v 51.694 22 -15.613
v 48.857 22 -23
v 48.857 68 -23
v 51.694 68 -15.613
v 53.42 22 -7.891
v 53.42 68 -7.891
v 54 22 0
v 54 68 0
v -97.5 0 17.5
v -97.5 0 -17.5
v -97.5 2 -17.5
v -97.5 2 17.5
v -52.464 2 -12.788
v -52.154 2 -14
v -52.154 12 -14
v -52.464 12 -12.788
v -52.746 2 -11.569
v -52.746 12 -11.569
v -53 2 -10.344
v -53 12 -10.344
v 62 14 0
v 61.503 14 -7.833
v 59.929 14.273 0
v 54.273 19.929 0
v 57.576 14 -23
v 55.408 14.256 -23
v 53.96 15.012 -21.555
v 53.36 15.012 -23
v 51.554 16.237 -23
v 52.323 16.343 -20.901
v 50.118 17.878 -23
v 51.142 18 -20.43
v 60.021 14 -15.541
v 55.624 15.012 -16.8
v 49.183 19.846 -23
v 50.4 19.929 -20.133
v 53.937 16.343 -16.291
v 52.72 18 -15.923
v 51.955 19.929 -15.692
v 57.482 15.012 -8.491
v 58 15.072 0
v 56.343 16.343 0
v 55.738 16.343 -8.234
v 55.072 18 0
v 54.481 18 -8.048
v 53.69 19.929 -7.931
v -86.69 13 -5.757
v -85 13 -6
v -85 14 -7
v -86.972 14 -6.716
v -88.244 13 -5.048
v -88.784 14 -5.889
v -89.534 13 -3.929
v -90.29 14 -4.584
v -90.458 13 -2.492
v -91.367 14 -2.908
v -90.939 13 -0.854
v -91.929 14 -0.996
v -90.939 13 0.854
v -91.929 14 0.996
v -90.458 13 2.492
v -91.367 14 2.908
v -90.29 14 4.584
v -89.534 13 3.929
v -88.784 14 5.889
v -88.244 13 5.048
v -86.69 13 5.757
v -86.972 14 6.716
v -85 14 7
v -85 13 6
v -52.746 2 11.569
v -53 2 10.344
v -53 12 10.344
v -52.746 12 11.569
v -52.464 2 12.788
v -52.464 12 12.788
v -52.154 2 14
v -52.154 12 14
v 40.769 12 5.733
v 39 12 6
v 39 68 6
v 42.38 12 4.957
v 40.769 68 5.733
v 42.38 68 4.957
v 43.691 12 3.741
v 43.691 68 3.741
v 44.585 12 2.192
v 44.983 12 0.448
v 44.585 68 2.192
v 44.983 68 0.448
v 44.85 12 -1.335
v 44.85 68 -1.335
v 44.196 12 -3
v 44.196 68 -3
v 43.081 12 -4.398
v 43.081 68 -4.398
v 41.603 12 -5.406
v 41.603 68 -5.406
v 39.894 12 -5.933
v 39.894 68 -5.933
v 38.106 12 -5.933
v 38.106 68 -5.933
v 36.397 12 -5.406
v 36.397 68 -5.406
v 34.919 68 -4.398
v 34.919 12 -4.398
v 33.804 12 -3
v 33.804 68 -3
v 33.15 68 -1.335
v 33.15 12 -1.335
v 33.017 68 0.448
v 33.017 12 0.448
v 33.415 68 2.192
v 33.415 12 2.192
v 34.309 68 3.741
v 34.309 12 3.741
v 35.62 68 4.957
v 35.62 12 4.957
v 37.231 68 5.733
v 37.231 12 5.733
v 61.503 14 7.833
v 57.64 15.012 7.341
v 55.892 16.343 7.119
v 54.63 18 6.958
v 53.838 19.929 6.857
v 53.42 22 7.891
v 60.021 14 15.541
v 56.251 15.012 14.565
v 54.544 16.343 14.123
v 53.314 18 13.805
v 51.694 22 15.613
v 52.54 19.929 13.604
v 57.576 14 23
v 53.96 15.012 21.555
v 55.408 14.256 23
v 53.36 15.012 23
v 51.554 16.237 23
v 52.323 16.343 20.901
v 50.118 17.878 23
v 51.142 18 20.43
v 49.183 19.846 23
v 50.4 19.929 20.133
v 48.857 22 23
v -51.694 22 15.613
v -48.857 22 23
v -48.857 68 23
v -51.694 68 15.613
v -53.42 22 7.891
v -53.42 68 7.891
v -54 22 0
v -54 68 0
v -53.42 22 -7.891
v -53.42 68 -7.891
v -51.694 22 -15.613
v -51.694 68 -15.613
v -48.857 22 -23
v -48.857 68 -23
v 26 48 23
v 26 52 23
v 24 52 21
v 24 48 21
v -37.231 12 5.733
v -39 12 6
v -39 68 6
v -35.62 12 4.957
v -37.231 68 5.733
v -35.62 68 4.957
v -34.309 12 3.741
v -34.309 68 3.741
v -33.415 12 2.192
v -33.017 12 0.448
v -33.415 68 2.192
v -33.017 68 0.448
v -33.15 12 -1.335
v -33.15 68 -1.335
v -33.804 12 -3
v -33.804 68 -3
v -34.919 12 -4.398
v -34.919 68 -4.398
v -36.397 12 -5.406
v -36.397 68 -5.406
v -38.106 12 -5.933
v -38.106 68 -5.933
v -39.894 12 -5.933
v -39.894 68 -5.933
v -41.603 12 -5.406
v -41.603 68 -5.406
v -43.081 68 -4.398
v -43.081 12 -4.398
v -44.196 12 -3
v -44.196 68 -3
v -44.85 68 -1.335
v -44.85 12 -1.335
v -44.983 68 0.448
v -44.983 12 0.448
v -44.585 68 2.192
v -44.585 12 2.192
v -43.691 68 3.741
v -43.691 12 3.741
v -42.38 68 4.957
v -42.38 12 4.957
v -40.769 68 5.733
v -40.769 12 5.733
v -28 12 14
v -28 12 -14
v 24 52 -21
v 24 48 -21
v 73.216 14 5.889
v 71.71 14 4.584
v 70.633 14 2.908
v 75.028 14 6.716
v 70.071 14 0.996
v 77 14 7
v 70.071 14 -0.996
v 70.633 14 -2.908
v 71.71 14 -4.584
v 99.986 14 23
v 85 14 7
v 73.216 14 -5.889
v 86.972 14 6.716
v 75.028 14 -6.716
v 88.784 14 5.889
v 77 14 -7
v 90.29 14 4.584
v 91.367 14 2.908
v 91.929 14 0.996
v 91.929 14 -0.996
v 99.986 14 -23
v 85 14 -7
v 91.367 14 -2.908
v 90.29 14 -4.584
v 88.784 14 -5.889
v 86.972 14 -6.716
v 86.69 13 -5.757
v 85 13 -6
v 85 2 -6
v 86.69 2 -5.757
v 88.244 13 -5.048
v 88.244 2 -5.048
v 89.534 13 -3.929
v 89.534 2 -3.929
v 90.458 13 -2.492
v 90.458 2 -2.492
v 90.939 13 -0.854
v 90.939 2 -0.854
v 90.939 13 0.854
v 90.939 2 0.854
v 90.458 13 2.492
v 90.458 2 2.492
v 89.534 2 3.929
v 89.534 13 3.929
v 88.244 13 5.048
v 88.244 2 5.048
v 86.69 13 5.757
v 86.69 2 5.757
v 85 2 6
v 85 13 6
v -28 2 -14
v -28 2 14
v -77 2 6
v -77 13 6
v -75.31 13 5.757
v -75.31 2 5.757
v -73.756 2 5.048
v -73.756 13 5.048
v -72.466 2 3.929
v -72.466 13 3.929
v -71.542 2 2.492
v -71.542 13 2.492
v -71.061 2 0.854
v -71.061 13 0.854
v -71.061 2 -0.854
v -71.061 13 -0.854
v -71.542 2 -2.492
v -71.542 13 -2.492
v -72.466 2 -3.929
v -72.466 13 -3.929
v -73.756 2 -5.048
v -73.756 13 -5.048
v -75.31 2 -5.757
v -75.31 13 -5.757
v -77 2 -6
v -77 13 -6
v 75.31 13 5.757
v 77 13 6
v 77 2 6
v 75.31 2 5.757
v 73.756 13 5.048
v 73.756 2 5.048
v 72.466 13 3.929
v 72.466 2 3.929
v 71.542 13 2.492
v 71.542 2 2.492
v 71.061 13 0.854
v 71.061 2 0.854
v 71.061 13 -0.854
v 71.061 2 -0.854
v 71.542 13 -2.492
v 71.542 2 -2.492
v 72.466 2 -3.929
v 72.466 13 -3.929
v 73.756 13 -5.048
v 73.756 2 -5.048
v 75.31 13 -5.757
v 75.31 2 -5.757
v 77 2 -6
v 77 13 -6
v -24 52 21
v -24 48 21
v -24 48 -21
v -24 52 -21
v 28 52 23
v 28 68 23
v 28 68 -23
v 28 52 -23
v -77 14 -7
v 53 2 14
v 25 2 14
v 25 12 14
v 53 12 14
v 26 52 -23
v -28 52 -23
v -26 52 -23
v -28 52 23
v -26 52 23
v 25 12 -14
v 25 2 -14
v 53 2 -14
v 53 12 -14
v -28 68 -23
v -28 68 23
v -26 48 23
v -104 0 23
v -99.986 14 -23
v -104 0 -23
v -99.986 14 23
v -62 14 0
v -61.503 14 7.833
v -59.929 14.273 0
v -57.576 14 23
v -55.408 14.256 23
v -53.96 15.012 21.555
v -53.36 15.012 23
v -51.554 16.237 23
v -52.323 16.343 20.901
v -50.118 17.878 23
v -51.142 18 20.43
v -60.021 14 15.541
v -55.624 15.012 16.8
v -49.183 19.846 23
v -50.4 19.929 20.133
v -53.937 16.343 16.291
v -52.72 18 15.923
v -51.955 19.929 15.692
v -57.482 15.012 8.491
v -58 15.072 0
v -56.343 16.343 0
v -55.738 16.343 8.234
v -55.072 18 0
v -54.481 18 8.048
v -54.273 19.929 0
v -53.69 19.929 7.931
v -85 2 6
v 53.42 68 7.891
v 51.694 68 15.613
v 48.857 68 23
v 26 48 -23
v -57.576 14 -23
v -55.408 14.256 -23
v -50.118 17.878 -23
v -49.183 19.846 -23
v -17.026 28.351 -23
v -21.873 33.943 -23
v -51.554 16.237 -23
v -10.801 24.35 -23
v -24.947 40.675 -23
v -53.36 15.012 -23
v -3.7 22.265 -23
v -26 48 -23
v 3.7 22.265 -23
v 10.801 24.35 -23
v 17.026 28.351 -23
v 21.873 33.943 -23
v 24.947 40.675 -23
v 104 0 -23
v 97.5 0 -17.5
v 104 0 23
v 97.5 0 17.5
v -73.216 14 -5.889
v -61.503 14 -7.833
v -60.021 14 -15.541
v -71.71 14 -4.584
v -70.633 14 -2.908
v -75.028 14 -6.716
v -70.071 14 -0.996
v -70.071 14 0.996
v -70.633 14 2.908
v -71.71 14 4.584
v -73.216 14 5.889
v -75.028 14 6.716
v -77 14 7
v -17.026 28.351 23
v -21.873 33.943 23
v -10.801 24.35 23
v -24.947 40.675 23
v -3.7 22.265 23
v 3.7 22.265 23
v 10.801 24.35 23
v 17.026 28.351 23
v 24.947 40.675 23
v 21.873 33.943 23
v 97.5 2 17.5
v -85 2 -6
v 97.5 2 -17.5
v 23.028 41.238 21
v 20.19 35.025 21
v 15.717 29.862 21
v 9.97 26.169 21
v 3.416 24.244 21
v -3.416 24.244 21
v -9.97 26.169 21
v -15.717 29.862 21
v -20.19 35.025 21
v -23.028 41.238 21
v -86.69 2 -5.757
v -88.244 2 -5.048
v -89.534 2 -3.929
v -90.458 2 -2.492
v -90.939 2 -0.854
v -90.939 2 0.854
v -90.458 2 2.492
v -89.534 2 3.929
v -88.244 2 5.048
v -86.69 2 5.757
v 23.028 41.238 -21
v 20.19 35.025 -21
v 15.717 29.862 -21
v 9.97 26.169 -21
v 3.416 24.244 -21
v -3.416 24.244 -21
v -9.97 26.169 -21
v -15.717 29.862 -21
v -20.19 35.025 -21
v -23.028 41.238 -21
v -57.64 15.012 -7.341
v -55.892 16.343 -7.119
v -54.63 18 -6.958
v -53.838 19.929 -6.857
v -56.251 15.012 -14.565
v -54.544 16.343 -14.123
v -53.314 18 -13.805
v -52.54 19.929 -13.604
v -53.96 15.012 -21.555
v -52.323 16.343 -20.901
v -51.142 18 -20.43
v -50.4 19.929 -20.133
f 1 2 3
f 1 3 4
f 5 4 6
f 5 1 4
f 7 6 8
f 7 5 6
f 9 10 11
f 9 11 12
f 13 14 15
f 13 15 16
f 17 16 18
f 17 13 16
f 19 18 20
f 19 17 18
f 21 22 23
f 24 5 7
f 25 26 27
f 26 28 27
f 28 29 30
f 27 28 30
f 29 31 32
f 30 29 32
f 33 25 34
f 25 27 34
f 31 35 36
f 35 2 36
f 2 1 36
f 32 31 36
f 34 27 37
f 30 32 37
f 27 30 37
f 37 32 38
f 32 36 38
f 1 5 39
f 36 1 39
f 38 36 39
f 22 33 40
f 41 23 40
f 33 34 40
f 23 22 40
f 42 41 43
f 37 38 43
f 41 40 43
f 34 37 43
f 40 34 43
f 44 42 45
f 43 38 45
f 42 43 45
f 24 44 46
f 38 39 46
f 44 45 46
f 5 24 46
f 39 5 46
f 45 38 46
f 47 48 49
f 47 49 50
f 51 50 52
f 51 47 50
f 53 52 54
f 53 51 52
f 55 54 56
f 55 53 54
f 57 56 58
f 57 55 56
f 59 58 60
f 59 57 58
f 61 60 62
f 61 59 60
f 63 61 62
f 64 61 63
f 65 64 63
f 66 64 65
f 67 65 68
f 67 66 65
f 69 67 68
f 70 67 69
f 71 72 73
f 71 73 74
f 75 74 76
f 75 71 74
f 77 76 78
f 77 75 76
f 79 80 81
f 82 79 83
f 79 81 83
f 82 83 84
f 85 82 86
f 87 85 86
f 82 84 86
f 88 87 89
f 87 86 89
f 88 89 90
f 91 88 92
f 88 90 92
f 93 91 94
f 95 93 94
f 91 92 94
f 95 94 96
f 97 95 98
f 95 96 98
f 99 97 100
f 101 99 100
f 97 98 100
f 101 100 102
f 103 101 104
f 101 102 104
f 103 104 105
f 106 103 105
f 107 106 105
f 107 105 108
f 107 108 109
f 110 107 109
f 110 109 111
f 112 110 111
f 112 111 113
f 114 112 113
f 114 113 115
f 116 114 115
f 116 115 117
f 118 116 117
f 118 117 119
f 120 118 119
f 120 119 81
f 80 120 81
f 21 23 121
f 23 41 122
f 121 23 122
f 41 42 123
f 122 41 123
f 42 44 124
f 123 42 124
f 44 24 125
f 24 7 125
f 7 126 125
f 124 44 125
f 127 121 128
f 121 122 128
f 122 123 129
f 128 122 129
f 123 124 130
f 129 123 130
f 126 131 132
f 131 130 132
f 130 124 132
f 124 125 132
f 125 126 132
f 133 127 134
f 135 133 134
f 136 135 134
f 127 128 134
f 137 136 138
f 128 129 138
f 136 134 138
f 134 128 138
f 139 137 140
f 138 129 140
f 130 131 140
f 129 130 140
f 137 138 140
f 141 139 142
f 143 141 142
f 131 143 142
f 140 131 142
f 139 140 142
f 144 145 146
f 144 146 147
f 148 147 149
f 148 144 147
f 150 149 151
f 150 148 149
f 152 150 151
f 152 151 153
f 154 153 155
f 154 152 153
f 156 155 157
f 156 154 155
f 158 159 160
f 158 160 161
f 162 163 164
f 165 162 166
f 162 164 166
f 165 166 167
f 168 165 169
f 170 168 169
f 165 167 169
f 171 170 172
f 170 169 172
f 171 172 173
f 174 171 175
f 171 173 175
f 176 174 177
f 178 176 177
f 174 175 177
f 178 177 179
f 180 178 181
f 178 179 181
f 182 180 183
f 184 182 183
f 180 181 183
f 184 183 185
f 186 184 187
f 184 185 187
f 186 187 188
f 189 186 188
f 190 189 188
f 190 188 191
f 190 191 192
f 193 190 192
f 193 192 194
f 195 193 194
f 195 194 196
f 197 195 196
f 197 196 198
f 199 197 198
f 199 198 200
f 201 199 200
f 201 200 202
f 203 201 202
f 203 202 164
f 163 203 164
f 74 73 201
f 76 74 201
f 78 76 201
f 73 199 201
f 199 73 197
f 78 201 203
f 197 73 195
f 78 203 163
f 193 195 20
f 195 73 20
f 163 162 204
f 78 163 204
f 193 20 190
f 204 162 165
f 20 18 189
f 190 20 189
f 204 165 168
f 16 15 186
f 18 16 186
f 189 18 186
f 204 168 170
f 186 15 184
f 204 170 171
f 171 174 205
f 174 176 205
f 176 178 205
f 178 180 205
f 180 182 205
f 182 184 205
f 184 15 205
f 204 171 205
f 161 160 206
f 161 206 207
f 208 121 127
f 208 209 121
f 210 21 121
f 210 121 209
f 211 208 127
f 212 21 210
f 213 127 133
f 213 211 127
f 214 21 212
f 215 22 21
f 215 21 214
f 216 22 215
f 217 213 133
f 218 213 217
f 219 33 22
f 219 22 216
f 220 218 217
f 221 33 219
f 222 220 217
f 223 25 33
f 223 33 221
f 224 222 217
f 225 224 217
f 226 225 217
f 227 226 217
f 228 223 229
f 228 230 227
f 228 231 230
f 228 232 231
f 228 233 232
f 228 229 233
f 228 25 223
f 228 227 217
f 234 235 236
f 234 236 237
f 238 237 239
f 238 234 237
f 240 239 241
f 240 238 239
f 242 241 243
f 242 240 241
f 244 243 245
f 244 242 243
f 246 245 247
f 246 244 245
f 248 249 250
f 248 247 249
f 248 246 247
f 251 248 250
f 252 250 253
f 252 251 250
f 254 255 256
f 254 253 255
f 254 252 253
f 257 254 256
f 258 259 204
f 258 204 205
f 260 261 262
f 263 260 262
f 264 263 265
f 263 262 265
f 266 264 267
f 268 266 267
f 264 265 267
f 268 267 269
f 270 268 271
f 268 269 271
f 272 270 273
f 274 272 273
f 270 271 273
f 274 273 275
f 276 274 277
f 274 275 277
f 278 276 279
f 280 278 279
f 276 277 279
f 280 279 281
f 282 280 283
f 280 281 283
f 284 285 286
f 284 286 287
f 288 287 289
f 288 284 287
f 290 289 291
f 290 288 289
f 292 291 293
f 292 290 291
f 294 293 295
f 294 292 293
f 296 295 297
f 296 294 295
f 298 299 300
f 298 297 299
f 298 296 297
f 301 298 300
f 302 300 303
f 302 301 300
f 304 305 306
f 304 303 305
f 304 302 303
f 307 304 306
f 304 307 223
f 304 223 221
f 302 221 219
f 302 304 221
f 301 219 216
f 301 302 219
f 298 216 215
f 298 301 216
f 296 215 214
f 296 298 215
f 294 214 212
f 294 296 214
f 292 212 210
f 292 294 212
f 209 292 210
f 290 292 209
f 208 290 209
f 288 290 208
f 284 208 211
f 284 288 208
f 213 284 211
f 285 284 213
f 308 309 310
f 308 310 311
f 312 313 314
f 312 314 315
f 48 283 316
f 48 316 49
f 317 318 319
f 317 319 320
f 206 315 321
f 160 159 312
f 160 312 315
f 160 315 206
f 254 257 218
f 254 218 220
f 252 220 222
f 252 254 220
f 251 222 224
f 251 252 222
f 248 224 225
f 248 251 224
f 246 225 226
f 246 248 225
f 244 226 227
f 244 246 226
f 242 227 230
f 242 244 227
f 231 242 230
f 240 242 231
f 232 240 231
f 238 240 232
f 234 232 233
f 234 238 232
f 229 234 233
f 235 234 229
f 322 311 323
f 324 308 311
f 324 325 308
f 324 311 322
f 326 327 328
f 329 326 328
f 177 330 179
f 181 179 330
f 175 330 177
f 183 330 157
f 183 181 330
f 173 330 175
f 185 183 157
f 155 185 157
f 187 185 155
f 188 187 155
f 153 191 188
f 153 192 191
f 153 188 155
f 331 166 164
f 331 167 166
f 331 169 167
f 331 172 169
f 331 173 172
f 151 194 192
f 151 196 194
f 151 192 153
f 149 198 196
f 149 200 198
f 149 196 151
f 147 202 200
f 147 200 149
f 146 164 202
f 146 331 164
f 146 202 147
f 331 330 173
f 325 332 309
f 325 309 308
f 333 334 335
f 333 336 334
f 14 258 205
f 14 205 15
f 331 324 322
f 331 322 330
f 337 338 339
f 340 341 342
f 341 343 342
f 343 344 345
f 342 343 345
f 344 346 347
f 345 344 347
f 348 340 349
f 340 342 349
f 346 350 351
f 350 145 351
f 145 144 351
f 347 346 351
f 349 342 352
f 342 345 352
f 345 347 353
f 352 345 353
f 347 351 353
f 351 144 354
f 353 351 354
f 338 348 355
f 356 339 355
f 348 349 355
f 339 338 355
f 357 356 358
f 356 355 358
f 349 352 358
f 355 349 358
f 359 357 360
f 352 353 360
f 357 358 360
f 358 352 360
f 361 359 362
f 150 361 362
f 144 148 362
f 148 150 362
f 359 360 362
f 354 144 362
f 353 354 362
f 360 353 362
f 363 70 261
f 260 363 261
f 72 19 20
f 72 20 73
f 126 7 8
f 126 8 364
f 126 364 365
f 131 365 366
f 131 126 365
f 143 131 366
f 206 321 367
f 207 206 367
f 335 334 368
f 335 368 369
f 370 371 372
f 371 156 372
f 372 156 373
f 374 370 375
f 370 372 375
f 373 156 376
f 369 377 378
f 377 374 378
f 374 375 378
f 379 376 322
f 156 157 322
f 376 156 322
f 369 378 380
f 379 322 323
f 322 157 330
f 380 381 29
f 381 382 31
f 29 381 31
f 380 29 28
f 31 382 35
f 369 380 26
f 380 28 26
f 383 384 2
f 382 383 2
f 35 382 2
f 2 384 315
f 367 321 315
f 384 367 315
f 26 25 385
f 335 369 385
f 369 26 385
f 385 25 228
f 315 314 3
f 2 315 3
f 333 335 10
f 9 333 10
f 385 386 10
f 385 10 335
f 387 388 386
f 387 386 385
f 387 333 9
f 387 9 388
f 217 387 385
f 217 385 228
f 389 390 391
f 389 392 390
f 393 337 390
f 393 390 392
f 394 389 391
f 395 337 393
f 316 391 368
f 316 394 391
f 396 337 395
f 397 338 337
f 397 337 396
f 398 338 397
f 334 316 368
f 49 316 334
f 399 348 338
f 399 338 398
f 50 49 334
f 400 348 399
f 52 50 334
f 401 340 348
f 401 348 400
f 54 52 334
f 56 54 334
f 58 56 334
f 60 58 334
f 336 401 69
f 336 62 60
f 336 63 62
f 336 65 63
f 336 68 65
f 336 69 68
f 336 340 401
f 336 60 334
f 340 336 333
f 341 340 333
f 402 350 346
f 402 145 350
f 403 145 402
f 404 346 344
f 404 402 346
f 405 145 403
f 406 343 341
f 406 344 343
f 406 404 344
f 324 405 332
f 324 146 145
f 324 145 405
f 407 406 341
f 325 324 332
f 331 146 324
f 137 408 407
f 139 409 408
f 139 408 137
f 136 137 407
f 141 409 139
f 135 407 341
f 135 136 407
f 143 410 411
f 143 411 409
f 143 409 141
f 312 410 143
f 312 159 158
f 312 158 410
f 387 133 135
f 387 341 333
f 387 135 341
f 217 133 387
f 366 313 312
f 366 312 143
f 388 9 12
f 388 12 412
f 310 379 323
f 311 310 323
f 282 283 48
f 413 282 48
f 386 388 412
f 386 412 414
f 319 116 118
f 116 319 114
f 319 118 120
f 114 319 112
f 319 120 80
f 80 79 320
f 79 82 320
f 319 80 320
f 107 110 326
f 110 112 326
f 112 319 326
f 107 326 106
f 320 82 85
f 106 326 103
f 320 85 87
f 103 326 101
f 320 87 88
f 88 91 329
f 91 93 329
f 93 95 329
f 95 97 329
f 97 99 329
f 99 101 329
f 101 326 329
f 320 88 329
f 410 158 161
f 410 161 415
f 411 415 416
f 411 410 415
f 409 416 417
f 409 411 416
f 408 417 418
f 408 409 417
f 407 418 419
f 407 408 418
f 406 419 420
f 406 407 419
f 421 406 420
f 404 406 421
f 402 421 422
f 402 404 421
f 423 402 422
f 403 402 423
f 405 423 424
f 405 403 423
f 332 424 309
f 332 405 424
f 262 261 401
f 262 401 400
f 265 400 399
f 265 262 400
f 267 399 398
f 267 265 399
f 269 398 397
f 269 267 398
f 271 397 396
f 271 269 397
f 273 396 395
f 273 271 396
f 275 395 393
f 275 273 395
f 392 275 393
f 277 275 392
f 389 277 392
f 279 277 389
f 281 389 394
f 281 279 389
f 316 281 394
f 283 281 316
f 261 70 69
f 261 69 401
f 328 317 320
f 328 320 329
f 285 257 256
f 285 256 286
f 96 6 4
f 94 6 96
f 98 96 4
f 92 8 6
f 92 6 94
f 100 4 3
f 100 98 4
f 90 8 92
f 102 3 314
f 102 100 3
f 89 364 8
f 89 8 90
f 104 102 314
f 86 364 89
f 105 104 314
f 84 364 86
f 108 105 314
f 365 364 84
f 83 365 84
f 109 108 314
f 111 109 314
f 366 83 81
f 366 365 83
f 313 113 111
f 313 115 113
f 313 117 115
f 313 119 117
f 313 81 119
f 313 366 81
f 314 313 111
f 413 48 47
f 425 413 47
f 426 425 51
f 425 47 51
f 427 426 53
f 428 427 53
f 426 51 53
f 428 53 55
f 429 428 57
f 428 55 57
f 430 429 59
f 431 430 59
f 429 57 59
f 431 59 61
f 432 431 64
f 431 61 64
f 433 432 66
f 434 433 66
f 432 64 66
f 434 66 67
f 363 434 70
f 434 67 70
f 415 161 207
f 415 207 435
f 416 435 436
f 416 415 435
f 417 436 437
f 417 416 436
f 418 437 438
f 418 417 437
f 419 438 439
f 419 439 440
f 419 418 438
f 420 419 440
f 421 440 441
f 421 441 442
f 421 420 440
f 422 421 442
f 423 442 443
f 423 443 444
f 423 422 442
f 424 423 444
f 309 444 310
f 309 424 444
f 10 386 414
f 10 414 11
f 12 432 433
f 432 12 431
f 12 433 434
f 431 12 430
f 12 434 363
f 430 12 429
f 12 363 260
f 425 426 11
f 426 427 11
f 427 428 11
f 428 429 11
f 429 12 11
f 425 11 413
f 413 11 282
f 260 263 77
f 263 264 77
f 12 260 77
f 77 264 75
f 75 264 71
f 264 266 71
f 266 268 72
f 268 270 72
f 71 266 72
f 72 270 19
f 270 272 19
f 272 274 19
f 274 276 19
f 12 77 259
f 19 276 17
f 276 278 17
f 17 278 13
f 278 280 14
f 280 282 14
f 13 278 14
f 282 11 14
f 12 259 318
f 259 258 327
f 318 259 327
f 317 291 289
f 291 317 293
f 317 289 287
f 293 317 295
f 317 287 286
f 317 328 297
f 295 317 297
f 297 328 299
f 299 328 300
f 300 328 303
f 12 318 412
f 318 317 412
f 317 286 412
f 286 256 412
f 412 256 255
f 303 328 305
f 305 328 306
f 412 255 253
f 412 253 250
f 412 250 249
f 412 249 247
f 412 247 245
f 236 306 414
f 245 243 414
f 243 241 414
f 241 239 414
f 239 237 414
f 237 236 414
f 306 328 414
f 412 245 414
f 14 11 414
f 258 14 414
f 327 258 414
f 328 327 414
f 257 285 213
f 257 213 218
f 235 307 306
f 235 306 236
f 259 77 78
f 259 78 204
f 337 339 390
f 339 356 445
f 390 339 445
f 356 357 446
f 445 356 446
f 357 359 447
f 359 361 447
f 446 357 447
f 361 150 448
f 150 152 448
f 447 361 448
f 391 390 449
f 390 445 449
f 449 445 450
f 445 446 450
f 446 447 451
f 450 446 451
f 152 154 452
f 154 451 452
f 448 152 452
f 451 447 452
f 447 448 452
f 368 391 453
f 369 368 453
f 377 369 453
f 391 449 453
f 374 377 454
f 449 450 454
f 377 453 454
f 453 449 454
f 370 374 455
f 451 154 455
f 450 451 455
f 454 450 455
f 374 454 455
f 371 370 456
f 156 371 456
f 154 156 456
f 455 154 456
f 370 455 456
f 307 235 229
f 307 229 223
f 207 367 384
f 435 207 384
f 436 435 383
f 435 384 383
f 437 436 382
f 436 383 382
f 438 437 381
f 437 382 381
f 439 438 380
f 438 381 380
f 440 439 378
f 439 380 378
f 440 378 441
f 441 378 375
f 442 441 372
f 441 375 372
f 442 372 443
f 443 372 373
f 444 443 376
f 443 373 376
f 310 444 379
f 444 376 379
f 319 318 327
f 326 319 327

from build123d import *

# Parameters (mm, degrees)
BOSS_EXTRUDE1_DEPTH = 23
CUT_EXTRUDE1_DEPTH  = 76
CHAMFER1_SIZE       = 2
CUT_EXTRUDE2_START  = -68
SKETCH4_R           = 6
SKETCH4_W           = 28
SKETCH4_H           = 28
SKETCH4_W_2         = 3
CUT_EXTRUDE2_DEPTH  = 2
SKETCH4_3_R         = 6
CUT_EXTRUDE3_DEPTH  = 127.368508735
CUT_EXTRUDE4_START  = -66
SKETCH4_4_R         = 6
SKETCH4_4_W         = 28
SKETCH4_4_H         = 28
CUT_EXTRUDE4_DEPTH  = 10
CHAMFER2_SIZE       = 1
FILLET1_R           = 8


with BuildPart() as part:
    # Sketch1 → Boss-Extrude1 (new, symmetric)
    with BuildSketch(Plane.XY):
        with BuildLine():
            Line((-104, 0), (104, 0))
            Line((104, 0), (99.985564599, 14))
            Line((99.985564599, 14), (54, 14))
            Line((54, 14), (54, 68))
            Line((54, 68), (28, 68))
            Line((28, 68), (28, 52))
            Line((28, 52), (24, 52))
            Line((24, 52), (24, 48))
            ThreePointArc((24, 48), (0, 24), (-24, 48))
            Line((-24, 48), (-24, 52))
            Line((-24, 52), (-28, 52))
            Line((-28, 52), (-28, 68))
            Line((-28, 68), (-54, 68))
            Line((-54, 68), (-54, 14))
            Line((-54, 14), (-99.985564599, 14))
            Line((-99.985564599, 14), (-104, 0))
        make_face()
    extrude(amount=BOSS_EXTRUDE1_DEPTH, both=True)

    # Sketch3 → Cut-Extrude1 (cut)
    with BuildSketch(Plane(origin=(0, 14, 0), x_dir=(1, 0, 0), z_dir=(0, 1, 0))):
        with BuildLine():
            Line((-48.856934001, 23), (-54, 23))
            Line((-54, 23), (-54, 2.63e-07))
            ThreePointArc((-54, 2.63e-07), (-52.698550407, 11.784005473), (-48.856934001, 23))
        make_face()
        with BuildLine():
            ThreePointArc((-48.856934001, -23), (-52.698550464, -11.784005217), (-54, 2.63e-07))
            Line((-54, 2.63e-07), (-54, -23))
            Line((-54, -23), (-48.856934001, -23))
        make_face()
        with BuildLine():
            Line((48.856934001, -23), (54, -23))
            Line((54, -23), (54, 0))
            ThreePointArc((54, 0), (52.698550436, -11.784005345), (48.856934001, -23))
        make_face()
        with BuildLine():
            ThreePointArc((48.856934001, 23), (52.698550436, 11.784005345), (54, 0))
            Line((54, 0), (54, 23))
            Line((54, 23), (48.856934001, 23))
        make_face()
    extrude(amount=CUT_EXTRUDE1_DEPTH, mode=Mode.SUBTRACT)

    # Chamfer1
    chamfer1_edges = [part.edges().sort_by_distance(p)[0] for p in [
        (-24, 50, -23),
        (0, 24, -23),
        (24, 50, -23),
        (24, 50, 23),
        (0, 24, 23),
        (-24, 50, 23),
    ]]
    chamfer(chamfer1_edges, length=CHAMFER1_SIZE)

    # Sketch4 → Cut-Extrude2 (cut)
    # profile 1 of 14: a face of its own
    with BuildSketch(Plane(origin=(0, 68, 0), x_dir=(1, 0, 0), z_dir=(0, 1, 0)).offset(CUT_EXTRUDE2_START)):
        with BuildLine():
            Line((-53, 10.344080433), (-53, 14))
            Line((-53, 14), (-52.153619242, 14))
            ThreePointArc((-52.153619242, 14), (-51.649321328, 15.759048395), (-51.085712288, 17.5))
            Line((-51.085712288, 17.5), (-97.5, 17.5))
            Line((-97.5, 17.5), (-97.5, -17.5))
            Line((-97.5, -17.5), (-51.085712288, -17.5))
            ThreePointArc((-51.085712288, -17.5), (-51.649321328, -15.759048395), (-52.153619242, -14))
            Line((-52.153619242, -14), (-53, -14))
            Line((-53, -14), (-53, -10.344080433))
            ThreePointArc((-53, -10.344080433), (-54, 0), (-53, 10.344080433))
        make_face()
        with BuildLine():
            ThreePointArc((-85, -6), (-91, 0), (-85, 6))
            Line((-85, 6), (-77, 6))
            ThreePointArc((-77, 6), (-71, 0), (-77, -6))
            Line((-77, -6), (-85, -6))
        make_face(mode=Mode.SUBTRACT)
    # profile 2 of 14: a face of its own
    with BuildSketch(Plane(origin=(0, 68, 0), x_dir=(1, 0, 0), z_dir=(0, 1, 0)).offset(CUT_EXTRUDE2_START)):
        with BuildLine():
            Line((-28, 14), (-52.153619242, 14))
            ThreePointArc((-52.153619242, 14), (-52.608576743, 12.179394612), (-53, 10.344080433))
            Line((-53, 10.344080433), (-53, -10.344080433))
            ThreePointArc((-53, -10.344080433), (-52.608576743, -12.179394612), (-52.153619242, -14))
            Line((-52.153619242, -14), (-28, -14))
            Line((-28, -14), (-28, 14))
        make_face()
        with Locations((-39, 0)):
            Circle(SKETCH4_R, mode=Mode.SUBTRACT)
    # profile 3 of 14: a face of its own
    with BuildSketch(Plane(origin=(0, 68, 0), x_dir=(1, 0, 0), z_dir=(0, 1, 0)).offset(CUT_EXTRUDE2_START)):
        with Locations((-39, 0)):
            Circle(SKETCH4_R)
    # profile 4 of 14: a face of its own
    with BuildSketch(Plane(origin=(0, 68, 0), x_dir=(1, 0, 0), z_dir=(0, 1, 0)).offset(CUT_EXTRUDE2_START)):
        with BuildLine():
            Line((-85, -6), (-77, -6))
            ThreePointArc((-77, -6), (-71, 0), (-77, 6))
            Line((-77, 6), (-85, 6))
            ThreePointArc((-85, 6), (-91, 0), (-85, -6))
        make_face()
    # profile 5 of 14: a face of its own
    with BuildSketch(Plane(origin=(0, 68, 0), x_dir=(1, 0, 0), z_dir=(0, 1, 0)).offset(CUT_EXTRUDE2_START)):
        with BuildLine():
            Line((-28, -17.5), (-28, -14))
            Line((-28, -14), (-52.153619242, -14))
            ThreePointArc((-52.153619242, -14), (-51.649321328, -15.759048395), (-51.085712288, -17.5))
            Line((-51.085712288, -17.5), (-28, -17.5))
        make_face()
    # profile 6 of 14: a face of its own
    with BuildSketch(Plane(origin=(0, 68, 0), x_dir=(1, 0, 0), z_dir=(0, 1, 0)).offset(CUT_EXTRUDE2_START)):
        with BuildLine():
            ThreePointArc((-51.085712288, 17.5), (-51.649321328, 15.759048395), (-52.153619242, 14))
            Line((-52.153619242, 14), (-28, 14))
            Line((-28, 14), (-28, 17.5))
            Line((-28, 17.5), (-51.085712288, 17.5))
        make_face()
    # profile 7 of 14: a face of its own
    with BuildSketch(Plane(origin=(0, 68, 0), x_dir=(1, 0, 0), z_dir=(0, 1, 0)).offset(CUT_EXTRUDE2_START)):
        Polygon((-28, 17.5), (-28, 14), (-25, 14), (-25, -14), (-28, -14), (-28, -17.5), (97.5, -17.5), (97.5, 17.5), align=None)
        with Locations((39, 0)):
            Rectangle(SKETCH4_W, SKETCH4_H, mode=Mode.SUBTRACT)
        with BuildLine():
            Line((77, 6), (85, 6))
            ThreePointArc((85, 6), (91, 0), (85, -6))
            Line((85, -6), (77, -6))
            ThreePointArc((77, -6), (71, 0), (77, 6))
        make_face(mode=Mode.SUBTRACT)
    # profile 8 of 14: a face of its own
    with BuildSketch(Plane(origin=(0, 68, 0), x_dir=(1, 0, 0), z_dir=(0, 1, 0)).offset(CUT_EXTRUDE2_START)):
        with BuildLine():
            ThreePointArc((-52.153619242, -14), (-52.608576743, -12.179394612), (-53, -10.344080433))
            Line((-53, -10.344080433), (-53, -14))
            Line((-53, -14), (-52.153619242, -14))
        make_face()
    # profile 9 of 14: a face of its own
    with BuildSketch(Plane(origin=(0, 68, 0), x_dir=(1, 0, 0), z_dir=(0, 1, 0)).offset(CUT_EXTRUDE2_START)):
        with BuildLine():
            Line((-53, -10.344080433), (-53, 10.344080433))
            ThreePointArc((-53, 10.344080433), (-54, 0), (-53, -10.344080433))
        make_face()
    # profile 10 of 14: a face of its own
    with BuildSketch(Plane(origin=(0, 68, 0), x_dir=(1, 0, 0), z_dir=(0, 1, 0)).offset(CUT_EXTRUDE2_START)):
        with BuildLine():
            Line((-52.153619242, 14), (-53, 14))
            Line((-53, 14), (-53, 10.344080433))
            ThreePointArc((-53, 10.344080433), (-52.608576743, 12.179394612), (-52.153619242, 14))
        make_face()
    # profile 11 of 14: a face of its own
    with BuildSketch(Plane(origin=(0, 68, 0), x_dir=(1, 0, 0), z_dir=(0, 1, 0)).offset(CUT_EXTRUDE2_START)):
        with Locations((-26.5, 0)):
            Rectangle(SKETCH4_W_2, SKETCH4_H)
    # profile 12 of 14: a face of its own
    with BuildSketch(Plane(origin=(0, 68, 0), x_dir=(1, 0, 0), z_dir=(0, 1, 0)).offset(CUT_EXTRUDE2_START)):
        with BuildLine():
            ThreePointArc((77, -6), (71, 0), (77, 6))
            Line((77, 6), (85, 6))
            ThreePointArc((85, 6), (91, 0), (85, -6))
            Line((85, -6), (77, -6))
        make_face()
    # profile 13 of 14: a face of its own
    with BuildSketch(Plane(origin=(0, 68, 0), x_dir=(1, 0, 0), z_dir=(0, 1, 0)).offset(CUT_EXTRUDE2_START)):
        with Locations((39, 0)):
            Rectangle(SKETCH4_W, SKETCH4_H)
        with Locations((39, 0)):
            Circle(SKETCH4_R, mode=Mode.SUBTRACT)
    # profile 14 of 14: a face of its own
    with BuildSketch(Plane(origin=(0, 68, 0), x_dir=(1, 0, 0), z_dir=(0, 1, 0)).offset(CUT_EXTRUDE2_START)):
        with Locations((39, 0)):
            Circle(SKETCH4_R)
    extrude(amount=CUT_EXTRUDE2_DEPTH, mode=Mode.SUBTRACT)

    # Sketch4<3> → Cut-Extrude3 (cut, through all)
    with BuildSketch(Plane(origin=(0, 68, 0), x_dir=(1, 0, 0), z_dir=(0, 1, 0))):
        with Locations(Location((-39, 0, 0), (0, 0, 270))):
            Circle(SKETCH4_3_R)
        with Locations(Location((39, 0, 0), (0, 0, 270))):
            Circle(SKETCH4_3_R)
        with BuildLine():
            Line((-85, -6), (-77, -6))
            ThreePointArc((-77, -6), (-71, 0), (-77, 6))
            Line((-77, 6), (-85, 6))
            ThreePointArc((-85, 6), (-91, 0), (-85, -6))
        make_face()
        with BuildLine():
            ThreePointArc((77, -6), (71, 0), (77, 6))
            Line((77, 6), (85, 6))
            ThreePointArc((85, 6), (91, 0), (85, -6))
            Line((85, -6), (77, -6))
        make_face()
    extrude(amount=-CUT_EXTRUDE3_DEPTH, mode=Mode.SUBTRACT)

    # Sketch4<4> → Cut-Extrude4 (cut)
    # profile 1 of 4: a face of its own
    with BuildSketch(Plane(origin=(0, 68, 0), x_dir=(1, 0, 0), z_dir=(0, 1, 0)).offset(CUT_EXTRUDE4_START)):
        with BuildLine():
            Line((-28, 14), (-52.153619242, 14))
            ThreePointArc((-52.153619242, 14), (-52.608576743, 12.179394612), (-53, 10.344080433))
            Line((-53, 10.344080433), (-53, -10.344080433))
            ThreePointArc((-53, -10.344080433), (-52.608576743, -12.179394612), (-52.153619242, -14))
            Line((-52.153619242, -14), (-28, -14))
            Line((-28, -14), (-28, 14))
        make_face()
        with Locations(Location((-39, 0, 0), (0, 0, 270))):
            Circle(SKETCH4_4_R, mode=Mode.SUBTRACT)
    # profile 2 of 4: a face of its own
    with BuildSketch(Plane(origin=(0, 68, 0), x_dir=(1, 0, 0), z_dir=(0, 1, 0)).offset(CUT_EXTRUDE4_START)):
        with Locations((39, 0)):
            Rectangle(SKETCH4_4_W, SKETCH4_4_H)
        with Locations(Location((39, 0, 0), (0, 0, 270))):
            Circle(SKETCH4_4_R, mode=Mode.SUBTRACT)
    # profile 3 of 4: a face of its own
    with BuildSketch(Plane(origin=(0, 68, 0), x_dir=(1, 0, 0), z_dir=(0, 1, 0)).offset(CUT_EXTRUDE4_START)):
        with Locations(Location((-39, 0, 0), (0, 0, 270))):
            Circle(SKETCH4_4_R)
    # profile 4 of 4: a face of its own
    with BuildSketch(Plane(origin=(0, 68, 0), x_dir=(1, 0, 0), z_dir=(0, 1, 0)).offset(CUT_EXTRUDE4_START)):
        with Locations(Location((39, 0, 0), (0, 0, 270))):
            Circle(SKETCH4_4_R)
    extrude(amount=CUT_EXTRUDE4_DEPTH, mode=Mode.SUBTRACT)

    # Chamfer2
    chamfer2_edges = [part.edges().sort_by_distance(p)[0] for p in [
        (71, 14, 0),
        (81, 14, -6),
        (91, 14, 0),
        (81, 14, 6),
        (-81, 14, 6),
        (-91, 14, 0),
        (-81, 14, -6),
        (-71, 14, 0),
    ]]
    chamfer(chamfer2_edges, length=CHAMFER2_SIZE)

    # Fillet1
    fillet1_edges = [part.edges().sort_by_distance(p)[0] for p in [
        (-54, 14, 0),
        (54, 14, 0),
    ]]
    fillet(fillet1_edges, radius=FILLET1_R)


solid = part.part
